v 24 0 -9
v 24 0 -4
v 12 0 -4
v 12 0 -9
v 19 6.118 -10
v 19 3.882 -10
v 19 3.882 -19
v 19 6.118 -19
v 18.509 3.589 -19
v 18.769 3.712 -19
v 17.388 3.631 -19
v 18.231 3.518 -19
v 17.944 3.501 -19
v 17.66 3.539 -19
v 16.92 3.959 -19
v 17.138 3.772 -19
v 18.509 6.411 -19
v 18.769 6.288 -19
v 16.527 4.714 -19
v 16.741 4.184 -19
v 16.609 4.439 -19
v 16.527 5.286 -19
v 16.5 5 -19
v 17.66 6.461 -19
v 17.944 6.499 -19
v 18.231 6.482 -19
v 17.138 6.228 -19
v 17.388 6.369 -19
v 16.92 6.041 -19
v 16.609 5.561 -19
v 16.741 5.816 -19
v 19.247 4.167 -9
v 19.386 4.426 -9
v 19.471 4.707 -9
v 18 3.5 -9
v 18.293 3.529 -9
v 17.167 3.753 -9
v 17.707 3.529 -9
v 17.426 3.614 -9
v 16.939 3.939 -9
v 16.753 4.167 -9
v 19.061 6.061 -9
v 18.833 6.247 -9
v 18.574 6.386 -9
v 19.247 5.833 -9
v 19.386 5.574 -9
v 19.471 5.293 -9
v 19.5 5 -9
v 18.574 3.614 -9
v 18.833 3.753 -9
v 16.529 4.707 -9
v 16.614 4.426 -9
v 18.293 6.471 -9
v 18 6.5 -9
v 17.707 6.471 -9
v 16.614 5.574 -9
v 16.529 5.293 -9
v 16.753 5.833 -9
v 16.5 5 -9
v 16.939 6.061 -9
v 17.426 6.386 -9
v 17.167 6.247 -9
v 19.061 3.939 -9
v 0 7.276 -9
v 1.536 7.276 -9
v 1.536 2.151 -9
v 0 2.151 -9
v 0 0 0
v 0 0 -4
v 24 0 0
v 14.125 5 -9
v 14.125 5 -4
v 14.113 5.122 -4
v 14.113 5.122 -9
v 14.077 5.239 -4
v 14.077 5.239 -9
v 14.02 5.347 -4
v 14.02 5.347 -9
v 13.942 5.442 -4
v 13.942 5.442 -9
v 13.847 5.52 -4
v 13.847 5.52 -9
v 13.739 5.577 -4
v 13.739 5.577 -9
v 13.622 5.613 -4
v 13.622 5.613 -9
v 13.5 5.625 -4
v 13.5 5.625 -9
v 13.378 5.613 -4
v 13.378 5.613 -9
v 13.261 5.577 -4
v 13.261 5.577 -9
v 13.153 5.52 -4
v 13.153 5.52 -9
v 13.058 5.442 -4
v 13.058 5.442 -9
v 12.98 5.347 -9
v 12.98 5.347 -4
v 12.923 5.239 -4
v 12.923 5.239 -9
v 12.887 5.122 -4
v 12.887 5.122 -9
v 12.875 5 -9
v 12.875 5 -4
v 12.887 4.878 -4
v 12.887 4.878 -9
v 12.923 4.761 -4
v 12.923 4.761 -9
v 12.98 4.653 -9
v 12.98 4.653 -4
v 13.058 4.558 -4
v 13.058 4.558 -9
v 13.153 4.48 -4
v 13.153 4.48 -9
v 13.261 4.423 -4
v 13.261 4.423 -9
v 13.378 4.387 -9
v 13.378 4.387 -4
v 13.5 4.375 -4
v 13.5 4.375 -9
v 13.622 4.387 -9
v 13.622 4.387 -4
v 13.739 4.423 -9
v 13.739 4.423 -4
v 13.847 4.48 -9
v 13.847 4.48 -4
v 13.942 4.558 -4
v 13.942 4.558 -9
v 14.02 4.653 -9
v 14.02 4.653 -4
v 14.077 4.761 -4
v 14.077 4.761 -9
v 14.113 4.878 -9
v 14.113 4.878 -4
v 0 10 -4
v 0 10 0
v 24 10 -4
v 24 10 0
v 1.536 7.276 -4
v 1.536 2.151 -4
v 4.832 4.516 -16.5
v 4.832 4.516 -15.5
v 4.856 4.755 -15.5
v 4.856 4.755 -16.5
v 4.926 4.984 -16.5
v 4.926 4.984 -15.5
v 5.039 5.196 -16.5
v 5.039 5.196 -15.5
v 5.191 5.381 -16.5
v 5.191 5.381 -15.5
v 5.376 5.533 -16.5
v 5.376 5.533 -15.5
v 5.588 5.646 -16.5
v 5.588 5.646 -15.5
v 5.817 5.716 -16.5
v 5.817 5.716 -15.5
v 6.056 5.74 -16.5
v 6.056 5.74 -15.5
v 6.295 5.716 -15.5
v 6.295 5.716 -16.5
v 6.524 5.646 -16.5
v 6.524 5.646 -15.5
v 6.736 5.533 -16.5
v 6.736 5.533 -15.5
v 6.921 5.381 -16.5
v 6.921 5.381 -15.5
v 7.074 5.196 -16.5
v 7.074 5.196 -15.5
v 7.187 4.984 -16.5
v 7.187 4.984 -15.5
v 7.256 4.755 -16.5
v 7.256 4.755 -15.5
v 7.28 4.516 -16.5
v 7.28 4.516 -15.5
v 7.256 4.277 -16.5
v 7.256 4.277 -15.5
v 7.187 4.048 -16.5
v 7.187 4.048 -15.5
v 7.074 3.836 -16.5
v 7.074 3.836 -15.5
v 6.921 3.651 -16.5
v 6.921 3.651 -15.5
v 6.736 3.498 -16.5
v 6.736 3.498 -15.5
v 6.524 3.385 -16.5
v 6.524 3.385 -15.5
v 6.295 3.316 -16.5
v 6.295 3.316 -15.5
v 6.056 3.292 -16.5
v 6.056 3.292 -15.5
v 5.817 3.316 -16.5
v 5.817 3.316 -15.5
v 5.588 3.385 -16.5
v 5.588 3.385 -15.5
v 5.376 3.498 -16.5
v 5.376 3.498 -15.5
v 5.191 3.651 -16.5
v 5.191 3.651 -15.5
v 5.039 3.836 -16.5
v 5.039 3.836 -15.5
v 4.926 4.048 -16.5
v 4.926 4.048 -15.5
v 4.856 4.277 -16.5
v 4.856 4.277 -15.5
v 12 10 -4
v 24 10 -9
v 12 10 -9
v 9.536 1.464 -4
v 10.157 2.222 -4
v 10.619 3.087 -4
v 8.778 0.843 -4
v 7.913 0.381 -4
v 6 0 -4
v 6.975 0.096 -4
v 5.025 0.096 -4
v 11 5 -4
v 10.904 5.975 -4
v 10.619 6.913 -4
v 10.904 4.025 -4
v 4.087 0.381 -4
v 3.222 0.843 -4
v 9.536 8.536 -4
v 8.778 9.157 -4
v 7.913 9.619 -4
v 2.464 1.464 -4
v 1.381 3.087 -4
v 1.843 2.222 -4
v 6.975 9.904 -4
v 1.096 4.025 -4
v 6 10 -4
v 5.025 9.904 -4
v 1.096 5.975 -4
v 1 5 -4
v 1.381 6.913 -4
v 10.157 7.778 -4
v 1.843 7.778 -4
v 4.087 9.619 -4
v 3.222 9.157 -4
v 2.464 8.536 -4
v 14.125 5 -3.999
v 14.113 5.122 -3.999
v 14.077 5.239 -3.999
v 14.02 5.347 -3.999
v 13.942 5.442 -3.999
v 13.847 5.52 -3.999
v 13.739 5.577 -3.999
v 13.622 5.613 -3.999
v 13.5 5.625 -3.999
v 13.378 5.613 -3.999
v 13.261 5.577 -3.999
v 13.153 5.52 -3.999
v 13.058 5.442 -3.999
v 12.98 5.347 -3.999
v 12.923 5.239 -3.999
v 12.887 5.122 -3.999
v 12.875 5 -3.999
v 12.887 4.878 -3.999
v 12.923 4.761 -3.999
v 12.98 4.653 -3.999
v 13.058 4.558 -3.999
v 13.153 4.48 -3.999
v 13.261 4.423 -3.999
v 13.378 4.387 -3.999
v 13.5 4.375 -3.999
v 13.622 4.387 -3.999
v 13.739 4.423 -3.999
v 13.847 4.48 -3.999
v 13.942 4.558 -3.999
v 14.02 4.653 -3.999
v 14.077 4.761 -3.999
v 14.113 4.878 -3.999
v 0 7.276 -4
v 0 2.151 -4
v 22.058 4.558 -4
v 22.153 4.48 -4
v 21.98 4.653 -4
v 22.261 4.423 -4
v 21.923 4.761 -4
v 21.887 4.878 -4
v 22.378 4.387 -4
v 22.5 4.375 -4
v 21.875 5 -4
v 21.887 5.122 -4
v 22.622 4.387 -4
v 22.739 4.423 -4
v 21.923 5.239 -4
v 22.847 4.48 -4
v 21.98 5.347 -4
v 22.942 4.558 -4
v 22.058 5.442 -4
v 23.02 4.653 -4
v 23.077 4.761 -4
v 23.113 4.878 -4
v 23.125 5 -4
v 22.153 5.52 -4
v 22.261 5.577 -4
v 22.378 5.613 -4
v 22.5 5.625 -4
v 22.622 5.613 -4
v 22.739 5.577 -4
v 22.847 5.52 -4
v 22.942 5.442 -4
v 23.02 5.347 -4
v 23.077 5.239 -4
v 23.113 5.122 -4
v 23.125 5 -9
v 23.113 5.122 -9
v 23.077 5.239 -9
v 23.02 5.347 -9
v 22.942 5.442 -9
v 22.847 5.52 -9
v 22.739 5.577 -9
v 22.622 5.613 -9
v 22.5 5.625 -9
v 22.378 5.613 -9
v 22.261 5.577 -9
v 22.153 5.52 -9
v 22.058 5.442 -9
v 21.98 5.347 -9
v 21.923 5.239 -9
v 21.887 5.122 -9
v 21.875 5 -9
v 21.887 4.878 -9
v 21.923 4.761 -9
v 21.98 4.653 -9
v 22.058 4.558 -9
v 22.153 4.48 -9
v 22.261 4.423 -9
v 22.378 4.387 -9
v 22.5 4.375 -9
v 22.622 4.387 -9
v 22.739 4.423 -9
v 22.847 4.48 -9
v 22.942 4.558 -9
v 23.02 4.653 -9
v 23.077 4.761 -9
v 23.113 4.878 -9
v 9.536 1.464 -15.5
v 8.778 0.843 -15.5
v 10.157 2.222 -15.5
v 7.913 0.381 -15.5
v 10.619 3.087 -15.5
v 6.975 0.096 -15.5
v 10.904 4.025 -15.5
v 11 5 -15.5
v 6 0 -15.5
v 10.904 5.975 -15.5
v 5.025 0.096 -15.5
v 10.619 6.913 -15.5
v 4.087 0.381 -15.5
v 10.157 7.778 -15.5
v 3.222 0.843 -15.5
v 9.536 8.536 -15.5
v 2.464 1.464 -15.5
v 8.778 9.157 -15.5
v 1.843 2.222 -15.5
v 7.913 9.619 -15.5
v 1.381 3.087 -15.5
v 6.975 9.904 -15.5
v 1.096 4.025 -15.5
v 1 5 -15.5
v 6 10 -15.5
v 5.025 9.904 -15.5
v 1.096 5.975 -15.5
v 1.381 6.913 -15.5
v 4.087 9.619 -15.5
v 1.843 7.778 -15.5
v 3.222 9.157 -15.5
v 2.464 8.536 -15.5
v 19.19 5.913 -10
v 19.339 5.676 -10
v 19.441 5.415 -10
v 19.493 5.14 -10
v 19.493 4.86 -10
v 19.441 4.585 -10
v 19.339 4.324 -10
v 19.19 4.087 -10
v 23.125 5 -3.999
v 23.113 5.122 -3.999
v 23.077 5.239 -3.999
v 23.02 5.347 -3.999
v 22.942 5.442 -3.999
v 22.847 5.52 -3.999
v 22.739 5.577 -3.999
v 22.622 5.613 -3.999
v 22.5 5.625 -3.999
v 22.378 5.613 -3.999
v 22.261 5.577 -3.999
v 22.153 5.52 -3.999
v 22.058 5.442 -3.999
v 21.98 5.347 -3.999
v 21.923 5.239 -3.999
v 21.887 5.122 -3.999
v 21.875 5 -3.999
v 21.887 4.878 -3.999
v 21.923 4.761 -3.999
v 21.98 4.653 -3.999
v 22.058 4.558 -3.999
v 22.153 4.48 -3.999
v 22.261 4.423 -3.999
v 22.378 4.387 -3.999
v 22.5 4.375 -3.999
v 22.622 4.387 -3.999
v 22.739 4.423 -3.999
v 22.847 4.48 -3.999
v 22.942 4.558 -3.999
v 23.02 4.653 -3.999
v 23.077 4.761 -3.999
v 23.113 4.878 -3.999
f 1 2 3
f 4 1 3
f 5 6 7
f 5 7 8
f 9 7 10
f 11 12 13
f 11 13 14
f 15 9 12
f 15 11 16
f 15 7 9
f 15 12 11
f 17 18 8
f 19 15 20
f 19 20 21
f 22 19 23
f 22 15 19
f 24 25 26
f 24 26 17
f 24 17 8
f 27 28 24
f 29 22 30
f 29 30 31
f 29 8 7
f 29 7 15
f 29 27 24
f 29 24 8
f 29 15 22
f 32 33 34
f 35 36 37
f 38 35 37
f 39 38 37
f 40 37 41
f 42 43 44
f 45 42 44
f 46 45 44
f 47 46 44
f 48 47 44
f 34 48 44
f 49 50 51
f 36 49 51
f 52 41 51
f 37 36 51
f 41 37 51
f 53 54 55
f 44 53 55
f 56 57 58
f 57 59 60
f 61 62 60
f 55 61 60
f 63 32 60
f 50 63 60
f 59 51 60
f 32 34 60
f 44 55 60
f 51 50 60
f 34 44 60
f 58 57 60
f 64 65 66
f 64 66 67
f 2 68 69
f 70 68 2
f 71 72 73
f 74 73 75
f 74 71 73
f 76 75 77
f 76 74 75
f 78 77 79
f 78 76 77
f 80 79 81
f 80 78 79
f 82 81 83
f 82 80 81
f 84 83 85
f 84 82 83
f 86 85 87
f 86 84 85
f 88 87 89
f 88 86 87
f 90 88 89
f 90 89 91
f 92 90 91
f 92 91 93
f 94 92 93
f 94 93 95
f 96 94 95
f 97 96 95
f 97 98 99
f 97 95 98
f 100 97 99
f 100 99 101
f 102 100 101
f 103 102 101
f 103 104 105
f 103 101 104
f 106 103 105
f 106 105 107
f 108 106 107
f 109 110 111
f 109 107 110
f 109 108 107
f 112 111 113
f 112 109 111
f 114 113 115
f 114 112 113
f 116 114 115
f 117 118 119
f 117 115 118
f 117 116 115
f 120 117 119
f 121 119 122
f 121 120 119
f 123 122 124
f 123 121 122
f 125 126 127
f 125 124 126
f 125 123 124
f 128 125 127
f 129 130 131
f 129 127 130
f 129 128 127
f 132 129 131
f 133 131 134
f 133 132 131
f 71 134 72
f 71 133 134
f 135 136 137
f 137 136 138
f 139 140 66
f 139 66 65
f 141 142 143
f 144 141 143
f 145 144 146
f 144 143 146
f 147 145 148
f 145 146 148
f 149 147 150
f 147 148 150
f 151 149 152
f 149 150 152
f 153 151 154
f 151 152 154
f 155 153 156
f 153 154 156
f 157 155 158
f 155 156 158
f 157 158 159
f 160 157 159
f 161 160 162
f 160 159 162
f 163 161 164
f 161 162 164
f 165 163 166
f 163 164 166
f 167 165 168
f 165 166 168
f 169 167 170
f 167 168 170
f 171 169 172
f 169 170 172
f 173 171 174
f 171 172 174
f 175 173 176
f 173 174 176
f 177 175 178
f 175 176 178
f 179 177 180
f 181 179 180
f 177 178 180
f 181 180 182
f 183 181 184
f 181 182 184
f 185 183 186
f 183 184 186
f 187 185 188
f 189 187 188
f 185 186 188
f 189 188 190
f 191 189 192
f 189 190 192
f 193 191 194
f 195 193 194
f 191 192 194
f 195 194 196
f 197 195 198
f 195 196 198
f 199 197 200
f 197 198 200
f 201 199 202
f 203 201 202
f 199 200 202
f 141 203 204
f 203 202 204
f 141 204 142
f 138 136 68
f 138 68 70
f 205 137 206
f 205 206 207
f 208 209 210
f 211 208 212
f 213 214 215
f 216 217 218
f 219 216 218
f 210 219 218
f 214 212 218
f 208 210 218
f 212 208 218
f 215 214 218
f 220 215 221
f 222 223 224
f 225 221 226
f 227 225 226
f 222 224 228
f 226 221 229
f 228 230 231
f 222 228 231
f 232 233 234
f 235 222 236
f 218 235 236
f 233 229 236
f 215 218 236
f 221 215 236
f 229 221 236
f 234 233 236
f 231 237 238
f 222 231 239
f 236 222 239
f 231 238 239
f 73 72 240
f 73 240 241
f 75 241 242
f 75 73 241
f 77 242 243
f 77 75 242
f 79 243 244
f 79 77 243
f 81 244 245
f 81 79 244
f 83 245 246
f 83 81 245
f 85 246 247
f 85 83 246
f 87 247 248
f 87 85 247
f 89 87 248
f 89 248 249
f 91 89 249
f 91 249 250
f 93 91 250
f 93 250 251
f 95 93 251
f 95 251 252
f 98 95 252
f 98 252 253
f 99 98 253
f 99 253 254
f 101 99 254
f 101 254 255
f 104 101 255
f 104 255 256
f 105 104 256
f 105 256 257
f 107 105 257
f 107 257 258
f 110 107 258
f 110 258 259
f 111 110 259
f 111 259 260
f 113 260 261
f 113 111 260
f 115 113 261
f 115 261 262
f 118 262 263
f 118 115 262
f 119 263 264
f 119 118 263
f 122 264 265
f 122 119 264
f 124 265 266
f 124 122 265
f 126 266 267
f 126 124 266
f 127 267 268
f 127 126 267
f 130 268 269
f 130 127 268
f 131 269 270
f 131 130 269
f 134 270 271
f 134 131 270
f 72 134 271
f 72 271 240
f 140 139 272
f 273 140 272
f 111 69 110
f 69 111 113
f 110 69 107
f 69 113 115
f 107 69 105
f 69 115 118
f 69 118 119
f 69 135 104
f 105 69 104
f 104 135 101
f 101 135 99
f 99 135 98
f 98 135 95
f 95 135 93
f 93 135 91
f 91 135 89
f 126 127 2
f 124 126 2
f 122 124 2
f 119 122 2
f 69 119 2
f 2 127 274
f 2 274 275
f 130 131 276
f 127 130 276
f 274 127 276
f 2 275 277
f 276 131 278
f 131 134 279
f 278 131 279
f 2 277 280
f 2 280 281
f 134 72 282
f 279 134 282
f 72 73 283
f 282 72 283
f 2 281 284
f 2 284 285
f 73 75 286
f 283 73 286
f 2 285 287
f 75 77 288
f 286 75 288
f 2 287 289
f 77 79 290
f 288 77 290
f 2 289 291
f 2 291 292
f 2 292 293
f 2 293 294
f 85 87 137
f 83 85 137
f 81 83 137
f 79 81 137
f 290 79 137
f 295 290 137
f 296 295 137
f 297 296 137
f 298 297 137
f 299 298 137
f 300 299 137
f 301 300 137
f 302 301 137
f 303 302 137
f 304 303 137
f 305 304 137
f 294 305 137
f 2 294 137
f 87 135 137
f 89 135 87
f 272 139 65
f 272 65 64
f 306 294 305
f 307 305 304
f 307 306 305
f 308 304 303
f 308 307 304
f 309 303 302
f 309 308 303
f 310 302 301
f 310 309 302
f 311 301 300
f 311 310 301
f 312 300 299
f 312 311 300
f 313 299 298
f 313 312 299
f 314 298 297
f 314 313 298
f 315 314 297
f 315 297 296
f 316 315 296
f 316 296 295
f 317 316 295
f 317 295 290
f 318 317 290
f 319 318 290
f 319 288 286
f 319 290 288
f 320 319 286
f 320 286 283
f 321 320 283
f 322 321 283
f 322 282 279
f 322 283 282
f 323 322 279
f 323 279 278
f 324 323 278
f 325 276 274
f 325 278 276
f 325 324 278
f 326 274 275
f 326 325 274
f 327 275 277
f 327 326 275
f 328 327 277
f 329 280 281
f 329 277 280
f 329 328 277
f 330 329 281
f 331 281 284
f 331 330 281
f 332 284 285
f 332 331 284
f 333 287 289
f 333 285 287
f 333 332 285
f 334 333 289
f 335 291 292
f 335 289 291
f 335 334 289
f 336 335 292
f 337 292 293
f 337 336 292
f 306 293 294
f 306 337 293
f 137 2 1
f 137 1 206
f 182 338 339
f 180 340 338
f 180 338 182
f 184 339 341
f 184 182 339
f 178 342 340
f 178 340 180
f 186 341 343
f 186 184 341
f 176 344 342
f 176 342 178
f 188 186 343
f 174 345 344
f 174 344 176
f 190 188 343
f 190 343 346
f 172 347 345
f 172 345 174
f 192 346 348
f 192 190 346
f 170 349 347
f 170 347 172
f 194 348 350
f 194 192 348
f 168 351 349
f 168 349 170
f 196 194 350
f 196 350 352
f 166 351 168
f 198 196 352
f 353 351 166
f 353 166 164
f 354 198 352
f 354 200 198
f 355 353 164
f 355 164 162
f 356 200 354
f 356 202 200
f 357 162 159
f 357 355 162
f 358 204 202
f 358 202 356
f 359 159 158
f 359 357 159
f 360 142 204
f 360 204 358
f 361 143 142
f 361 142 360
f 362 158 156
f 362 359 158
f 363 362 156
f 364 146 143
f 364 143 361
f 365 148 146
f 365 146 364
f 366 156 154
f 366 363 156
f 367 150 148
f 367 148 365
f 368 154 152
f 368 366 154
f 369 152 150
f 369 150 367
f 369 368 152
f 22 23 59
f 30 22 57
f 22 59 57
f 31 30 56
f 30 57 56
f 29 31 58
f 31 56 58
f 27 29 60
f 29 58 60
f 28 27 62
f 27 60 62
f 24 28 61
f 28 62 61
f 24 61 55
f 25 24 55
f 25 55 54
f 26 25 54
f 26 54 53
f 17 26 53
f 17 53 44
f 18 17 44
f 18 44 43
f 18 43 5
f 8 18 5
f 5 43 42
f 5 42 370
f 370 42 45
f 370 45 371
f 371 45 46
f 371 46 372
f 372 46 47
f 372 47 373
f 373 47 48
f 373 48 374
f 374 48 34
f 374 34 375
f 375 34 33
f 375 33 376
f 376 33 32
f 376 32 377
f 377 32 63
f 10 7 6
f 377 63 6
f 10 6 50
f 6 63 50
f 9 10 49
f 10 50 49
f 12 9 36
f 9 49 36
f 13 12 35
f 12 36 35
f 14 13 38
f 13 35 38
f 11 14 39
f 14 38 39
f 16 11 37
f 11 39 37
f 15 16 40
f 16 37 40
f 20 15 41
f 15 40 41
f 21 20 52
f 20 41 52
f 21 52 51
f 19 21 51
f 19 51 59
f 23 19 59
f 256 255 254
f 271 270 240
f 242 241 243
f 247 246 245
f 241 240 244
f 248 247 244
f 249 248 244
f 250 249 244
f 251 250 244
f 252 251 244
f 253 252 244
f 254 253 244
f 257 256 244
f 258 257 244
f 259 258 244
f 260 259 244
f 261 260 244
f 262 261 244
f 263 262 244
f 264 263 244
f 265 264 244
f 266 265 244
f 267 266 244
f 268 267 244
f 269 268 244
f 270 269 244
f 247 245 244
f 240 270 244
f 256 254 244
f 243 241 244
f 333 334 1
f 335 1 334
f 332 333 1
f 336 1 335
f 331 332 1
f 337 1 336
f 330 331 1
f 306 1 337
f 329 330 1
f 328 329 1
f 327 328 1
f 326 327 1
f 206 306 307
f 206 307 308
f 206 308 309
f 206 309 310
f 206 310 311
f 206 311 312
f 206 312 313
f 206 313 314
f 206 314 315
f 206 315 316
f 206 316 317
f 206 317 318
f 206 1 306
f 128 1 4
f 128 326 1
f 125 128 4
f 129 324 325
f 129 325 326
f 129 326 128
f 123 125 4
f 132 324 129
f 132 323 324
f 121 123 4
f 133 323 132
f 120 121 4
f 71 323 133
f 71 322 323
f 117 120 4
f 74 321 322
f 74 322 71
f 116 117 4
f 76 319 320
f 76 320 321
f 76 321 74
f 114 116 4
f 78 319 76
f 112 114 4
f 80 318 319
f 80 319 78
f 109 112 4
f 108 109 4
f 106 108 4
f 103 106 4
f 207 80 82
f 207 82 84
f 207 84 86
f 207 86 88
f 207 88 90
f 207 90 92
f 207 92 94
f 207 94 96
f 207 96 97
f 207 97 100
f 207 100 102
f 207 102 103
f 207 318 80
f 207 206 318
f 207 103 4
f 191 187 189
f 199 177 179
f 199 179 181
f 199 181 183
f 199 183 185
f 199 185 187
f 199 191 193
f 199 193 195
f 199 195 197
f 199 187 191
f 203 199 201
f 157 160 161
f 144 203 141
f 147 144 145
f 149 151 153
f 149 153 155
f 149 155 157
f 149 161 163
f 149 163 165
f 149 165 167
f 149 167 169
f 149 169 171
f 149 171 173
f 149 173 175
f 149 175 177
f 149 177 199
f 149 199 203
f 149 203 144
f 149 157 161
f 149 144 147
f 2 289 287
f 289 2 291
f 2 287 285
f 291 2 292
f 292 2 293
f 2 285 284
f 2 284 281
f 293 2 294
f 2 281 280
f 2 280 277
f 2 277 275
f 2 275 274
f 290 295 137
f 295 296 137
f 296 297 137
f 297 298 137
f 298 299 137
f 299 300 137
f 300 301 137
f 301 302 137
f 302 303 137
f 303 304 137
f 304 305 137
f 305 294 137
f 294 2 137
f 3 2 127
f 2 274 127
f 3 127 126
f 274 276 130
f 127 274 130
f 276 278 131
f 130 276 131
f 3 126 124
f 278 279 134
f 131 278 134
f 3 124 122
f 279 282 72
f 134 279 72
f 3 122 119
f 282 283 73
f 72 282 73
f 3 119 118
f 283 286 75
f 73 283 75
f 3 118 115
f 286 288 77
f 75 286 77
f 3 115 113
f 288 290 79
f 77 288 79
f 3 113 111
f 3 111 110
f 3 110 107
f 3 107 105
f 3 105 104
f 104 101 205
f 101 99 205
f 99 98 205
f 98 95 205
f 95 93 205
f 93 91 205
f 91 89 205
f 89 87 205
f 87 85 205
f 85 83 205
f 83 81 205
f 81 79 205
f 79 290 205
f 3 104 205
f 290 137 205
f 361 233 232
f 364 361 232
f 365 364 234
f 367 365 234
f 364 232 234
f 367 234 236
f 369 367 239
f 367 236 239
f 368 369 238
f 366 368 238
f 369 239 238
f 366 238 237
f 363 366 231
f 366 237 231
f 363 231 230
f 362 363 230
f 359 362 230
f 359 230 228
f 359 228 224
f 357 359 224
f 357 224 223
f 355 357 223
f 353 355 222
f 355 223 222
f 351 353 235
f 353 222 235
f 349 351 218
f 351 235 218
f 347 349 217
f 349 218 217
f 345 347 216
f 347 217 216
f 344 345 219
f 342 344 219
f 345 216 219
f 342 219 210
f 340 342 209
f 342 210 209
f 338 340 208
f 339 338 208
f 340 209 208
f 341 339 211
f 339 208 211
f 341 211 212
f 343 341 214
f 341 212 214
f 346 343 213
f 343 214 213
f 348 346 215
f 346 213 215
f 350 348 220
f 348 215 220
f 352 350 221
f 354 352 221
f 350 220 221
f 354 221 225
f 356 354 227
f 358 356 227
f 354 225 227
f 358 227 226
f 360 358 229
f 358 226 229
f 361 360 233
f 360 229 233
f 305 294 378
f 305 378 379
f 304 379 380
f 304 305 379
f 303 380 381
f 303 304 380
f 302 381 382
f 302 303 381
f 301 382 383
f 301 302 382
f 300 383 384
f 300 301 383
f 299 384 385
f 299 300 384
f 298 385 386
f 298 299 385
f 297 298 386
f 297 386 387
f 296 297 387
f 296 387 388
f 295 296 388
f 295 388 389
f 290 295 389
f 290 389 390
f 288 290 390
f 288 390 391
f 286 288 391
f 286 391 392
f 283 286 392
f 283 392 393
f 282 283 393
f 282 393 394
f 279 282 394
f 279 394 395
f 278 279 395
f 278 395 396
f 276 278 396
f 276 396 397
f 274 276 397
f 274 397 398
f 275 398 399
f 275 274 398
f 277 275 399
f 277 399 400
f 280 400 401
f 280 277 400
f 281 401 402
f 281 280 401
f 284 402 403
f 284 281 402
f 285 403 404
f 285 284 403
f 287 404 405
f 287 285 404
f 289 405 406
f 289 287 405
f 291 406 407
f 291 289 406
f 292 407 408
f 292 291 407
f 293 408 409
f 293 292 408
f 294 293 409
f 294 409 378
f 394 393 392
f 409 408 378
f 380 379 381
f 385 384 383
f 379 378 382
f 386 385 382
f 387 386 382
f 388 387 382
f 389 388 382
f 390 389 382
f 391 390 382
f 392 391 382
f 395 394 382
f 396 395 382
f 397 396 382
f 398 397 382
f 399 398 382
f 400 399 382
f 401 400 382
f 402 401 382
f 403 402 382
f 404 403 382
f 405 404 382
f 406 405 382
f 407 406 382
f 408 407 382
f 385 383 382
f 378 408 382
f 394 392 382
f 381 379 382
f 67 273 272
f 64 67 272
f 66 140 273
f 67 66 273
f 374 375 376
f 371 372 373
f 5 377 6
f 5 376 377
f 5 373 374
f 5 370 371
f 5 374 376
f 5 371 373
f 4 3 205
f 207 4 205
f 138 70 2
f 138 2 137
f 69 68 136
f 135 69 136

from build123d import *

# Parameters (mm, degrees)
SKETCH_1_W                   = 24
SKETCH_1_H                   = 10
EXTRUDE_1_DEPTH              = 4
SKETCH_2_R                   = 5
EXTRUDE_2_DEPTH              = 11.5
SKETCH_4_R                   = 1.223700811
EXTRUDE_3_DEPTH              = 1
SKETCH_5_W                   = 12
SKETCH_5_H                   = 10
EXTRUDE_4_DEPTH              = 5
SKETCH_6_R                   = 1.5
EXTRUDE_5_DEPTH              = 10
HOLE_START                   = -9
HOLE_WIZARD_M1_6_1_OUTLINE_R = 0.625
HOLE_WIZARD_M1_6_1_DEPTH     = 5.001
SKETCH_9_W                   = 1.535552224
SKETCH_9_H                   = 5.125451512
EXTRUDE_6_DEPTH              = 5
CUT_EXTRUDE1_DEPTH           = 33.202484376
CUT_EXTRUDE1_DEPTH_BACK      = 9


# Read off the part's stored shape, not the designer's step: M1.6 螺纹孔1
with BuildPart() as part:
    # 草图1 → 凸台-拉伸1 (new body)
    with BuildSketch(Plane.XY):
        with Locations((12, 5)):
            Rectangle(SKETCH_1_W, SKETCH_1_H)
    extrude(amount=-EXTRUDE_1_DEPTH)


with BuildPart() as body_2:
    # 草图2 → 凸台-拉伸2 (new body)
    with BuildSketch(Plane(origin=(0, 0, -4), x_dir=(-1, 0, 0), z_dir=(0, 0, -1))):
        with Locations((-6, 5)):
            Circle(SKETCH_2_R)
    extrude(amount=EXTRUDE_2_DEPTH)

    # 草图4 → 凸台-拉伸3 (add)
    with BuildSketch(Plane(origin=(0, 0, -15.5), x_dir=(-1, 0, 0), z_dir=(0, 0, -1))):
        with Locations((-6.056056762, 4.515848892)):
            Circle(SKETCH_4_R)
    extrude(amount=EXTRUDE_3_DEPTH)


with BuildPart() as body_3:
    # 草图5 → 凸台-拉伸4 (new body)
    with BuildSketch(Plane(origin=(0, 0, -4), x_dir=(-1, 0, 0), z_dir=(0, 0, -1))):
        with Locations((-18, 5)):
            Rectangle(SKETCH_5_W, SKETCH_5_H)
    extrude(amount=EXTRUDE_4_DEPTH)


with BuildPart() as body_4:
    # 草图6 → 凸台-拉伸5 (new body)
    with BuildSketch(Plane(origin=(0, 0, -9), x_dir=(-1, 0, 0), z_dir=(0, 0, -1))):
        with Locations((-18, 5)):
            Circle(SKETCH_6_R)
    extrude(amount=EXTRUDE_5_DEPTH)

    # Sketch1 → Cut-Extrude1 (cut, two sides: drawn at the far end of the back side and taken through both)
    with BuildSketch(Plane(origin=(0, 0, -19), x_dir=(-1, 0, 0), z_dir=(0, 0, -1)).offset(-CUT_EXTRUDE1_DEPTH_BACK)):
        Polygon((-19, -46.039473837), (-19, 3.881966011), (-19, 6.118033989), (-19, 56.039473837), (-118.842879696, 56.039473837), (-118.842879696, -46.039473837), align=None)
    extrude(amount=CUT_EXTRUDE1_DEPTH + CUT_EXTRUDE1_DEPTH_BACK, mode=Mode.SUBTRACT)


with BuildPart() as hole_wizard_m1_6_1_tool:
    # M1.6 螺纹孔1 outline → M1.6 螺纹孔1 (new body)
    with BuildSketch(Plane.XY.offset(HOLE_START)):
        with Locations((13.5, 5)):
            Circle(HOLE_WIZARD_M1_6_1_OUTLINE_R)
        with Locations((22.5, 5)):
            Circle(HOLE_WIZARD_M1_6_1_OUTLINE_R)
    extrude(amount=HOLE_WIZARD_M1_6_1_DEPTH)


with BuildPart() as part_1:
    add(part.part)

    # M1.6 螺纹孔1: cut by hole_wizard_m1_6_1_tool
    add(hole_wizard_m1_6_1_tool.part, mode=Mode.SUBTRACT)


with BuildPart() as body_3_1:
    add(body_3.part)

    # M1.6 螺纹孔1: cut by hole_wizard_m1_6_1_tool
    add(hole_wizard_m1_6_1_tool.part, mode=Mode.SUBTRACT)


with BuildPart() as body_5:
    # 草图9 → 凸台-拉伸6 (new body)
    with BuildSketch(Plane(origin=(0, 0, -4), x_dir=(-1, 0, 0), z_dir=(0, 0, -1))):
        with Locations((-0.767776112, 4.713713687)):
            Rectangle(SKETCH_9_W, SKETCH_9_H)
    extrude(amount=EXTRUDE_6_DEPTH)


solid = Compound([body_2.part, body_4.part, part_1.part, body_3_1.part, body_5.part])
